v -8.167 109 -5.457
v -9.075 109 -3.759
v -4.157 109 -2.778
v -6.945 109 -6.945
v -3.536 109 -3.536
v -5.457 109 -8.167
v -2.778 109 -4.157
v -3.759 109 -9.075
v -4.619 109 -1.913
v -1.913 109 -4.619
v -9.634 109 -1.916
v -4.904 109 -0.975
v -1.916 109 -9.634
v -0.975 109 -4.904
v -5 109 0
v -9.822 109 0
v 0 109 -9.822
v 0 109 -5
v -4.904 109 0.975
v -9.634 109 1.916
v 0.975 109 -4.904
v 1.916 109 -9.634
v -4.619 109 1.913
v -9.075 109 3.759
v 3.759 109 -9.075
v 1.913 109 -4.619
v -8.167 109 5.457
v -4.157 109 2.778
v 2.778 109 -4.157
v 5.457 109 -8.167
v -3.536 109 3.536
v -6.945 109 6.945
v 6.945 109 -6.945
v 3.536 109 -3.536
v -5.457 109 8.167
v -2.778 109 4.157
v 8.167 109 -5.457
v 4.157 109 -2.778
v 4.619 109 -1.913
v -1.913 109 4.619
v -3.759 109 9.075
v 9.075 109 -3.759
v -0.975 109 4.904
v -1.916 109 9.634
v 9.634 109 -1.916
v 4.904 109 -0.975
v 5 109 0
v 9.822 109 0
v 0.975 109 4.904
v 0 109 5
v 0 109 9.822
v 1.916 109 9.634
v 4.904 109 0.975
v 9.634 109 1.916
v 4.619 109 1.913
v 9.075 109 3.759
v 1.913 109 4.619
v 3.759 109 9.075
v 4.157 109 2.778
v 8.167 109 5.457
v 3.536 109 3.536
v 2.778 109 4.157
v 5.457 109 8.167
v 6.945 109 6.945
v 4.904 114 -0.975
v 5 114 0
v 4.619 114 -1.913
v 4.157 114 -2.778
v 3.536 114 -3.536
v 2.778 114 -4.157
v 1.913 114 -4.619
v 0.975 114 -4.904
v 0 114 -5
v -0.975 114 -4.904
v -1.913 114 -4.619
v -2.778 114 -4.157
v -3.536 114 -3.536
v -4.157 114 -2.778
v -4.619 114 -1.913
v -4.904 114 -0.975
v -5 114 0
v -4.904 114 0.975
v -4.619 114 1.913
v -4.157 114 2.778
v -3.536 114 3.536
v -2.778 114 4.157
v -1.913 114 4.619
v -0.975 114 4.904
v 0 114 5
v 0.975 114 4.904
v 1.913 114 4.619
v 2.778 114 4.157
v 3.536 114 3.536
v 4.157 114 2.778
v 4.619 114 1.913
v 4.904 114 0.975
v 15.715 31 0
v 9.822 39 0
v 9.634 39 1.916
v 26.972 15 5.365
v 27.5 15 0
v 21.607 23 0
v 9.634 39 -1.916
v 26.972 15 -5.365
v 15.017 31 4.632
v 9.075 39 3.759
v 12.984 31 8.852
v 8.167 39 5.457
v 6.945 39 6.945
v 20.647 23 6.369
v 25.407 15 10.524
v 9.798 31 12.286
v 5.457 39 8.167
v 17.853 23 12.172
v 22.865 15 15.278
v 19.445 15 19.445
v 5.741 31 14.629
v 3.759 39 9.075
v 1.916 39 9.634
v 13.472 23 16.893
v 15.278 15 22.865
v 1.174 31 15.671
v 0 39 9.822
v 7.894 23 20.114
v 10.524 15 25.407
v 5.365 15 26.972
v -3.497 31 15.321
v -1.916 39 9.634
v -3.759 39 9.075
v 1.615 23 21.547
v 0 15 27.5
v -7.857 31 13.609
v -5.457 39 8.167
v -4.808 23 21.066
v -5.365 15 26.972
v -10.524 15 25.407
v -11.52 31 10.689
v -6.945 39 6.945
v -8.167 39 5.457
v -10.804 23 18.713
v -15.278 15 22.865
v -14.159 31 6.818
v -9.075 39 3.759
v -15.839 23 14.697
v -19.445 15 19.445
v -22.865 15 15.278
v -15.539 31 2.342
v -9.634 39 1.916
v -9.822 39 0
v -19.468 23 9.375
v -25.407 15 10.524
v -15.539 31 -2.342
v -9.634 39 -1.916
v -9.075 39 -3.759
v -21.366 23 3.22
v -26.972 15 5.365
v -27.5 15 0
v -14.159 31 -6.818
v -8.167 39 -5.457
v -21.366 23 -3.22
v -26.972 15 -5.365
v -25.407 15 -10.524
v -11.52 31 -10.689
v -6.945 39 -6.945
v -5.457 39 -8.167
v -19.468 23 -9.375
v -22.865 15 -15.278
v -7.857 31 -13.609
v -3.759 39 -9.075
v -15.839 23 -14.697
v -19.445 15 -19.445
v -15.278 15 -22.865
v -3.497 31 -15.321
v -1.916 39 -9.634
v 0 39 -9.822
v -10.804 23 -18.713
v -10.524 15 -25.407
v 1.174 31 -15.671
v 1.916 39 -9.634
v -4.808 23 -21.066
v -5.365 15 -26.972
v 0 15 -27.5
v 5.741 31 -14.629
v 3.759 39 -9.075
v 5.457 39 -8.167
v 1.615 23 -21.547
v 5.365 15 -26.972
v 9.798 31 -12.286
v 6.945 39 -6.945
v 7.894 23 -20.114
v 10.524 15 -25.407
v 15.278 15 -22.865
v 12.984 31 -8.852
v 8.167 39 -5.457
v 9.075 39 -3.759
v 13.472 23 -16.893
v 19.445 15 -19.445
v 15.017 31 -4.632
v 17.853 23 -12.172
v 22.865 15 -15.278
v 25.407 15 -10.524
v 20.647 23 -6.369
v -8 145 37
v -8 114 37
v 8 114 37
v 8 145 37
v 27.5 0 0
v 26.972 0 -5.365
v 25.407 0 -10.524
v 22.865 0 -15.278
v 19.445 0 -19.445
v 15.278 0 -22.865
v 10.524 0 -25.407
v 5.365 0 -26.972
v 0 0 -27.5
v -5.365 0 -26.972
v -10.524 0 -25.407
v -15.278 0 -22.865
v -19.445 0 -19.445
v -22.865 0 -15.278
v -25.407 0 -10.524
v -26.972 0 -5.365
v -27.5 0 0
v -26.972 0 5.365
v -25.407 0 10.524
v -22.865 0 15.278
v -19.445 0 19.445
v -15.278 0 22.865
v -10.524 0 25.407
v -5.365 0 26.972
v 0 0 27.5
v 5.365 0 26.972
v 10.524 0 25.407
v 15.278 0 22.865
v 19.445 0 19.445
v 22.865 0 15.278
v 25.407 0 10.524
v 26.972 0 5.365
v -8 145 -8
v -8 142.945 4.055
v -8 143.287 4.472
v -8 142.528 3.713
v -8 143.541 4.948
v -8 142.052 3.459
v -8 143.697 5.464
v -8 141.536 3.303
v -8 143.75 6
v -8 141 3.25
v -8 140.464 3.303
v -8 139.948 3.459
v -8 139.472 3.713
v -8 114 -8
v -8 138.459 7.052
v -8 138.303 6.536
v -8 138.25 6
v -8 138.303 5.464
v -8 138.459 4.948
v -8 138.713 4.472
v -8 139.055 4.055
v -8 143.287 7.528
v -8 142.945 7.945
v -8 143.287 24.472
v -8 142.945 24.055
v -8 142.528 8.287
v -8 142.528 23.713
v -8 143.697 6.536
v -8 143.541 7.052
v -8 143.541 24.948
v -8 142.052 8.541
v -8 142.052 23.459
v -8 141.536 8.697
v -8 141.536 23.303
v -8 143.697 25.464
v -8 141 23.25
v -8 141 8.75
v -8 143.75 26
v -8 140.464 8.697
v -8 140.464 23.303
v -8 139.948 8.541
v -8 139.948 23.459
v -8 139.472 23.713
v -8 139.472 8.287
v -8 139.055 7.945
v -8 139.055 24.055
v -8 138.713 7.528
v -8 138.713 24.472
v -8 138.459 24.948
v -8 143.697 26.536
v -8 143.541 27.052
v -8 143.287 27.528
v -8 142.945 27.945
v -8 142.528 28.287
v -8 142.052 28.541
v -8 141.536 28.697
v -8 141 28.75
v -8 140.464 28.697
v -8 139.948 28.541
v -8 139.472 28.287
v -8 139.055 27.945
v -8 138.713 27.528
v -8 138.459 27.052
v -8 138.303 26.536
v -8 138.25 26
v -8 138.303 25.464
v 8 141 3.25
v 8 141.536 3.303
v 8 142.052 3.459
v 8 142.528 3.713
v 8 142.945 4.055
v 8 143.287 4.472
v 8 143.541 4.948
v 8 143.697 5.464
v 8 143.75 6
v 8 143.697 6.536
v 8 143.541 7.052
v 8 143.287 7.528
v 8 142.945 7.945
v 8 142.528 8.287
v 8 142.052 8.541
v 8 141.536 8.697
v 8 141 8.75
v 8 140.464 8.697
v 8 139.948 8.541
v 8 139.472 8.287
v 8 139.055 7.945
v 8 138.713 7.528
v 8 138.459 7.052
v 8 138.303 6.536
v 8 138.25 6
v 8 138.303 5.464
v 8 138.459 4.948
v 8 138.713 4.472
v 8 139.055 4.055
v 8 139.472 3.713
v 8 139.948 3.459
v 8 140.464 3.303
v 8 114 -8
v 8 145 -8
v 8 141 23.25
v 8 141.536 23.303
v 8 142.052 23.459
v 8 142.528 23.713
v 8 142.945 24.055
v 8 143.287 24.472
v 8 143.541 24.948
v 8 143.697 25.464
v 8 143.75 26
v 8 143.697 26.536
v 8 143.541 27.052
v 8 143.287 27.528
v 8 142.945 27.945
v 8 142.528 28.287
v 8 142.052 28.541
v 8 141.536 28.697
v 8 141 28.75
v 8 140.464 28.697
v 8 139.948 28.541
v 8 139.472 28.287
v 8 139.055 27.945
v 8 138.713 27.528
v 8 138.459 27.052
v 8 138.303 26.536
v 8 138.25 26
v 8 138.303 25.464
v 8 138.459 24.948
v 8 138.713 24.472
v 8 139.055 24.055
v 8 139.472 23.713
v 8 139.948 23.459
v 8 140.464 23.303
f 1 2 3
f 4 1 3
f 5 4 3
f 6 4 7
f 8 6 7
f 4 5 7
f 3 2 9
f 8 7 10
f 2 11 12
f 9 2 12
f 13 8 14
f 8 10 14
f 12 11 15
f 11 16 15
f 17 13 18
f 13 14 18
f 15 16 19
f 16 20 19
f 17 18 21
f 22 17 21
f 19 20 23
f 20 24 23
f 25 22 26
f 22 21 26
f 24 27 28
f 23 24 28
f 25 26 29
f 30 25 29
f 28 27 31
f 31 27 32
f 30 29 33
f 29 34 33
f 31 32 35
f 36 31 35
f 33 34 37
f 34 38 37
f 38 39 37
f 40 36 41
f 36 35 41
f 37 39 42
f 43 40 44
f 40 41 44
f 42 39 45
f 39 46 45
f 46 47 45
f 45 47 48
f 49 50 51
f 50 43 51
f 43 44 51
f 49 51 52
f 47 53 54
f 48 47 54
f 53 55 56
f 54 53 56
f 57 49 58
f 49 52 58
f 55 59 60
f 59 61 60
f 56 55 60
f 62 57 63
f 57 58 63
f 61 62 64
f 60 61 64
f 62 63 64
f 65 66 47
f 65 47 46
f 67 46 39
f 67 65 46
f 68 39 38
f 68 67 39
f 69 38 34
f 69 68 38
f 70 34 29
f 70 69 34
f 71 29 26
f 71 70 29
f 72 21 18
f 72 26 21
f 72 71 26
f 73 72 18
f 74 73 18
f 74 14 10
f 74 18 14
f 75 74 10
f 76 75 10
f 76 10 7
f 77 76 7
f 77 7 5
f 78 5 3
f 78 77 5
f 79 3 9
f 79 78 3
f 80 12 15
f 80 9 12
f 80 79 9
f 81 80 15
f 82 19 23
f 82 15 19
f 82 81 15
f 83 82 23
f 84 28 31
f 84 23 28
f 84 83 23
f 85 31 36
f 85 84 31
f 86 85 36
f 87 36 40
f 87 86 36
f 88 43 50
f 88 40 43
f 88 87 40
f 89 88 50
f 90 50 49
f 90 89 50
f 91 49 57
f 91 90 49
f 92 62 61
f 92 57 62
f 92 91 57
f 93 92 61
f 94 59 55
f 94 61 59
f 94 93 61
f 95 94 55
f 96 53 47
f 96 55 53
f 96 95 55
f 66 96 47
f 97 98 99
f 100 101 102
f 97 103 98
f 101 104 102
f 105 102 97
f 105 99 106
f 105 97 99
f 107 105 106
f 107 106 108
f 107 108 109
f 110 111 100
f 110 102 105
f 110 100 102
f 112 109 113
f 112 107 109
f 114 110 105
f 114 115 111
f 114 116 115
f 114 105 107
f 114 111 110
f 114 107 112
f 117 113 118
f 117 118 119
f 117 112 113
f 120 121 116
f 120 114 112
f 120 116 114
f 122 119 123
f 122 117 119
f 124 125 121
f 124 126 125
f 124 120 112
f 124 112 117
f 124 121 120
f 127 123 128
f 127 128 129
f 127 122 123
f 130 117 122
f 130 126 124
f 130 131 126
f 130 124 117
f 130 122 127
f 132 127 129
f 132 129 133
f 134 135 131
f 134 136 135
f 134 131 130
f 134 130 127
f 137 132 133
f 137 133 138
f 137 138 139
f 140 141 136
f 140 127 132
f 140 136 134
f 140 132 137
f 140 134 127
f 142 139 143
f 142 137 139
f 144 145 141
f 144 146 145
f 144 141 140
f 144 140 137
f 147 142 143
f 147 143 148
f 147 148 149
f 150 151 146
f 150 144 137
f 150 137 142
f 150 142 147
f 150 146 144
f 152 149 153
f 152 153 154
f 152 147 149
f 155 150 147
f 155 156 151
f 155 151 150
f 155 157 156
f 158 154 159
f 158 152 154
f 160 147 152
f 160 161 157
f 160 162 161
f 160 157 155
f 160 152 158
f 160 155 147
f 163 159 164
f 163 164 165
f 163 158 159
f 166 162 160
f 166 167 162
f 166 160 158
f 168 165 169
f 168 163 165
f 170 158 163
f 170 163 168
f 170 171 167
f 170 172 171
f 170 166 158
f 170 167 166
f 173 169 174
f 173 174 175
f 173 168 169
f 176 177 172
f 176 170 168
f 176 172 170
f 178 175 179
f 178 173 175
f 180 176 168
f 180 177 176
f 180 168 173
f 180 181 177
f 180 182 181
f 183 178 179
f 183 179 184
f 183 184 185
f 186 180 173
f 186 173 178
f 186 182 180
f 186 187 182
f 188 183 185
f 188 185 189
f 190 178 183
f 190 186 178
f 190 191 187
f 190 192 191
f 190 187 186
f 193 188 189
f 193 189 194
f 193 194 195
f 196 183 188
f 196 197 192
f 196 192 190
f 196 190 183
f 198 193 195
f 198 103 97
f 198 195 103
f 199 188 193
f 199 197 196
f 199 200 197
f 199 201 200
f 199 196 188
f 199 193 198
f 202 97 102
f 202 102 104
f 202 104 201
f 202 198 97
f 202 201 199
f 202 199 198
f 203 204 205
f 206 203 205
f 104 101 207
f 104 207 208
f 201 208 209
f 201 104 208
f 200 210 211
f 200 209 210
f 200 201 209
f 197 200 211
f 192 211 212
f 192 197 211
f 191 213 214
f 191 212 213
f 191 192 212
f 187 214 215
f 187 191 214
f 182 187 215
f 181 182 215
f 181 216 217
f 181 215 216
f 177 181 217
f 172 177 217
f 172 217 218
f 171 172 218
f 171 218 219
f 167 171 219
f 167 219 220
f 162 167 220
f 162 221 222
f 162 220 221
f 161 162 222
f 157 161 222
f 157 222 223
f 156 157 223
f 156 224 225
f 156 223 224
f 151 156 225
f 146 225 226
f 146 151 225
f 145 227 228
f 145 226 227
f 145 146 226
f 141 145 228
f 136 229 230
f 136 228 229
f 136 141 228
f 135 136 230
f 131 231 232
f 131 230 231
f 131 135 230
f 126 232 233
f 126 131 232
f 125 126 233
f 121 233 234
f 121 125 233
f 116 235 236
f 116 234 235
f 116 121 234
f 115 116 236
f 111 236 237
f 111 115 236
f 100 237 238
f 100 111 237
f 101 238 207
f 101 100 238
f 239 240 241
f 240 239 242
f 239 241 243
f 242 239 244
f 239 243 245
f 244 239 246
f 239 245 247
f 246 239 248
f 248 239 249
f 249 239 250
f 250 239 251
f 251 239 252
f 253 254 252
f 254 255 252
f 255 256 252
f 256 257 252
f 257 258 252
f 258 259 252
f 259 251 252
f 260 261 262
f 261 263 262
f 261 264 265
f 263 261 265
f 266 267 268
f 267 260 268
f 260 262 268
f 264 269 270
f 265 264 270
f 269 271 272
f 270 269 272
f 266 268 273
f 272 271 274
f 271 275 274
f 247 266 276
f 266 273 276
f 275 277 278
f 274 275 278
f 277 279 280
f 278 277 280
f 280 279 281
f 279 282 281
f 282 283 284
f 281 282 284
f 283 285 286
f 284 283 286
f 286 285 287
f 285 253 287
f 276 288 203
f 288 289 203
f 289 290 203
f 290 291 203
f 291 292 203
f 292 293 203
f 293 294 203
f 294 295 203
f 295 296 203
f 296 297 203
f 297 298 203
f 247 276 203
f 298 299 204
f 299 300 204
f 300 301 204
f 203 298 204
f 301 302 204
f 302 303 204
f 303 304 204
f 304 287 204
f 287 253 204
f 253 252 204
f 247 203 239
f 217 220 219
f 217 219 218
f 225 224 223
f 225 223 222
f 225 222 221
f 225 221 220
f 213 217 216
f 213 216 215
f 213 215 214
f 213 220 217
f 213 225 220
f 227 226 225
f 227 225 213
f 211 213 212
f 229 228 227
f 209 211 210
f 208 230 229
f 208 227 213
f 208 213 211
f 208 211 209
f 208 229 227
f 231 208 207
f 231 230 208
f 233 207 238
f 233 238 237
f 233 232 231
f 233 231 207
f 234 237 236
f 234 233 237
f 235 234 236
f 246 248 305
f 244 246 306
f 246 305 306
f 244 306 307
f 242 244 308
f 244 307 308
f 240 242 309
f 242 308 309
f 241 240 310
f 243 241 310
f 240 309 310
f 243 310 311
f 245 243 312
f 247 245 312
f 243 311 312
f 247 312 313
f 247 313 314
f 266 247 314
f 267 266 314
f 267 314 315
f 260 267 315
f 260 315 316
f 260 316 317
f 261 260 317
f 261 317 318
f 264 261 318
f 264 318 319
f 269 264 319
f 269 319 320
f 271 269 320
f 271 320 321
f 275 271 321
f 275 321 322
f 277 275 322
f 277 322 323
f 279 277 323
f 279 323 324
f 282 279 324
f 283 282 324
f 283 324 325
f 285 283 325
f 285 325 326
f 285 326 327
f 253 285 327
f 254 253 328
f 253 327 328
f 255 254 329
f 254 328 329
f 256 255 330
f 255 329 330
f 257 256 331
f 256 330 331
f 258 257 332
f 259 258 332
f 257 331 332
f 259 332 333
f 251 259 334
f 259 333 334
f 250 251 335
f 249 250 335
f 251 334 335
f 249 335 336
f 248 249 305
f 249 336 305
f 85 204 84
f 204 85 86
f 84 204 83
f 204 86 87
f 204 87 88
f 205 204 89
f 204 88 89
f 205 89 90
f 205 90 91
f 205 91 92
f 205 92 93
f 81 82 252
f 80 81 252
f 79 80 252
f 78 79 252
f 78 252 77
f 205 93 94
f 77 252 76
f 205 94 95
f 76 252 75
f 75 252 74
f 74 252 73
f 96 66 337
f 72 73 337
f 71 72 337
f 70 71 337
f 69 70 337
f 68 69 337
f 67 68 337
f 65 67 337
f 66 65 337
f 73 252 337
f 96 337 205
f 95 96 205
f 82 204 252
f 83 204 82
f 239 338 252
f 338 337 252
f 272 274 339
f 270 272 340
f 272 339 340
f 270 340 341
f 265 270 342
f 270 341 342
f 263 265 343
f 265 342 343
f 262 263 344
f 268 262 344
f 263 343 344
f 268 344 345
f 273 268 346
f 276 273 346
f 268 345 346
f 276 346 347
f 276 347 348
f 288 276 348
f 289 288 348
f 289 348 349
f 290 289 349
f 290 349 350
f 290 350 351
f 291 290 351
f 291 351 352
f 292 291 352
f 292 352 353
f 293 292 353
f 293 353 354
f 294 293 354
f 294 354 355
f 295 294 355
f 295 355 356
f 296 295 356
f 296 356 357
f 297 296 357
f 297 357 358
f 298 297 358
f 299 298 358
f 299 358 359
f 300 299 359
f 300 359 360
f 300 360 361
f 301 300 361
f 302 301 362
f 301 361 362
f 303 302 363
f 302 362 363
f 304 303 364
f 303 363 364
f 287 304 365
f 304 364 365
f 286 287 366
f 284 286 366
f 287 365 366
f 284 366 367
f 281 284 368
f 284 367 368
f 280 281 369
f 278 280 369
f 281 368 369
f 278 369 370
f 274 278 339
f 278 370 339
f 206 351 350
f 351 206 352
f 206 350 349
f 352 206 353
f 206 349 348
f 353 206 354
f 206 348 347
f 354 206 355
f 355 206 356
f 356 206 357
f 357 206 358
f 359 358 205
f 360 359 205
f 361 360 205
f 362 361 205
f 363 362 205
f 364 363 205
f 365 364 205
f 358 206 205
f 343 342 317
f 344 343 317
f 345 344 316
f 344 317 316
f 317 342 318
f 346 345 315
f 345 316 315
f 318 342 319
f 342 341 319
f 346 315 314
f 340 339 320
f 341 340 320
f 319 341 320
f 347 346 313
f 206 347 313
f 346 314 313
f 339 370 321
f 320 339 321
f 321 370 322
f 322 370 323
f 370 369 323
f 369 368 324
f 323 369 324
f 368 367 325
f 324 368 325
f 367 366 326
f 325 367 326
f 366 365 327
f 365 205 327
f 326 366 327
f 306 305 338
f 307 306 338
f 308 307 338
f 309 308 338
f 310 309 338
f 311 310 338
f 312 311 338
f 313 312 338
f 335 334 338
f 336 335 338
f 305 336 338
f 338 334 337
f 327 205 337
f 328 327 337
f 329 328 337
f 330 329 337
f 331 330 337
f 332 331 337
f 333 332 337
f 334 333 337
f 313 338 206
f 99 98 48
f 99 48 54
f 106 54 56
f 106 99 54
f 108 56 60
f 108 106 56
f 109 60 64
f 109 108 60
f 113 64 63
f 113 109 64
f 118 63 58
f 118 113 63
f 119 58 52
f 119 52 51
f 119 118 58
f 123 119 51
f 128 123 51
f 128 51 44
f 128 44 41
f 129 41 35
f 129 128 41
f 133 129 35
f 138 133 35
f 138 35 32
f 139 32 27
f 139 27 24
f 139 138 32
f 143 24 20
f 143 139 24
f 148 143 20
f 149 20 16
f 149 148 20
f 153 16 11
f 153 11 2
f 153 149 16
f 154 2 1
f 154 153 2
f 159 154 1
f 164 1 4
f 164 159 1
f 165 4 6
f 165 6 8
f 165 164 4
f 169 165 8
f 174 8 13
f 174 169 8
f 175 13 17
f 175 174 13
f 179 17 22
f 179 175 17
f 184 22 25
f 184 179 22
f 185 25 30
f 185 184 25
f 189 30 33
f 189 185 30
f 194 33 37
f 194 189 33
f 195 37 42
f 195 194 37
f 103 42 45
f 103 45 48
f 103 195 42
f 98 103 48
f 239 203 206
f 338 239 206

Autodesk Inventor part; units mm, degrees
ref_plane "YZ Plane" through (0, 0, 0) normal (1, 0, 0) x (0, 1, 0)
ref_plane "XZ Plane" through (0, 0, 0) normal (0, 1, 0) x (-1, 0, 0)
ref_plane "XY Plane" through (0, 0, 0) normal (0, 0, 1) x (1, 0, 0)
sketch "Sketch3" plane through (0, 0, 0) normal (0, 0, 1) x (1, 0, 0)
  line L0 (0, 0) -> (27.5, 0)
  line L1 (27.5, 0) -> (27.5, 15)
  line L2 (0, 32.6777) -> (0, 0)
  line L3 (0, 39) -> (0, 109)
  line L4 (5, 109) -> (9.8223, 109)
  line L5 (9.8223, 109) -> (9.8223, 39)
  line L6 (0, 109) -> (5, 109) construction
  line L7 (5, 109) -> (5, 114)
  line L8 (5, 114) -> (0, 114)
  line L9 (0, 114) -> (0, 109)
  line L10 (27.5, 15) -> (9.8223, 39)
  line L11 (0, 32.6777) -> (0, 39)
  dimension "d5" = 27.5
  dimension "d6" = 15
  dimension "d10" = 70
  dimension "d14" = 5
  dimension "d15" = 5
revolve "Revolution1" add sketch "Sketch3" angle 360 about axis through (0, 32.6777, 0) along (0, -1, 0)
sketch "Sketch5" plane through (0, 114, 0) normal (0, 1, 0) x (1, 0, 0)
  line L0 (0, 0) -> (0, 8) construction
  line L1 (0, 8) -> (-8, 8)
  line L2 (-8, 8) -> (-8, -37)
  line L3 (-8, -37) -> (8, -37)
  line L4 (8, -37) -> (8, 8)
  line L5 (8, 8) -> (0, 8)
  dimension "d16" = 8
  dimension "d17" = 8
  dimension "d18" = 45
  dimension "d19" = 16
extrude "Extrusion1" add sketch "Sketch5" along normal blind 31
sketch "Sketch6" plane through (8, 114, 37) normal (1, 0, 0) x (0, 0, -1)
  line L0 (0, 31) -> (11, 31) construction
  line L1 (0, 31) -> (45, 31) construction
  line L2 (11, 31) -> (11, 27) construction
  line L3 (11, 31) -> (31, 31) construction
  line L4 (31, 31) -> (31, 27) construction
  circle A0 centre (11, 27) radius 2.75
  circle A1 centre (31, 27) radius 2.75
  point P0 (37, -114)
  point P1 (22.5, 31)
  point P2 (0, 31)
  dimension "d28" = 11
  dimension "d29" = 20
extrude "Extrusion2" cut sketch "Sketch6" against normal blind 16
properties part number "Suction"
